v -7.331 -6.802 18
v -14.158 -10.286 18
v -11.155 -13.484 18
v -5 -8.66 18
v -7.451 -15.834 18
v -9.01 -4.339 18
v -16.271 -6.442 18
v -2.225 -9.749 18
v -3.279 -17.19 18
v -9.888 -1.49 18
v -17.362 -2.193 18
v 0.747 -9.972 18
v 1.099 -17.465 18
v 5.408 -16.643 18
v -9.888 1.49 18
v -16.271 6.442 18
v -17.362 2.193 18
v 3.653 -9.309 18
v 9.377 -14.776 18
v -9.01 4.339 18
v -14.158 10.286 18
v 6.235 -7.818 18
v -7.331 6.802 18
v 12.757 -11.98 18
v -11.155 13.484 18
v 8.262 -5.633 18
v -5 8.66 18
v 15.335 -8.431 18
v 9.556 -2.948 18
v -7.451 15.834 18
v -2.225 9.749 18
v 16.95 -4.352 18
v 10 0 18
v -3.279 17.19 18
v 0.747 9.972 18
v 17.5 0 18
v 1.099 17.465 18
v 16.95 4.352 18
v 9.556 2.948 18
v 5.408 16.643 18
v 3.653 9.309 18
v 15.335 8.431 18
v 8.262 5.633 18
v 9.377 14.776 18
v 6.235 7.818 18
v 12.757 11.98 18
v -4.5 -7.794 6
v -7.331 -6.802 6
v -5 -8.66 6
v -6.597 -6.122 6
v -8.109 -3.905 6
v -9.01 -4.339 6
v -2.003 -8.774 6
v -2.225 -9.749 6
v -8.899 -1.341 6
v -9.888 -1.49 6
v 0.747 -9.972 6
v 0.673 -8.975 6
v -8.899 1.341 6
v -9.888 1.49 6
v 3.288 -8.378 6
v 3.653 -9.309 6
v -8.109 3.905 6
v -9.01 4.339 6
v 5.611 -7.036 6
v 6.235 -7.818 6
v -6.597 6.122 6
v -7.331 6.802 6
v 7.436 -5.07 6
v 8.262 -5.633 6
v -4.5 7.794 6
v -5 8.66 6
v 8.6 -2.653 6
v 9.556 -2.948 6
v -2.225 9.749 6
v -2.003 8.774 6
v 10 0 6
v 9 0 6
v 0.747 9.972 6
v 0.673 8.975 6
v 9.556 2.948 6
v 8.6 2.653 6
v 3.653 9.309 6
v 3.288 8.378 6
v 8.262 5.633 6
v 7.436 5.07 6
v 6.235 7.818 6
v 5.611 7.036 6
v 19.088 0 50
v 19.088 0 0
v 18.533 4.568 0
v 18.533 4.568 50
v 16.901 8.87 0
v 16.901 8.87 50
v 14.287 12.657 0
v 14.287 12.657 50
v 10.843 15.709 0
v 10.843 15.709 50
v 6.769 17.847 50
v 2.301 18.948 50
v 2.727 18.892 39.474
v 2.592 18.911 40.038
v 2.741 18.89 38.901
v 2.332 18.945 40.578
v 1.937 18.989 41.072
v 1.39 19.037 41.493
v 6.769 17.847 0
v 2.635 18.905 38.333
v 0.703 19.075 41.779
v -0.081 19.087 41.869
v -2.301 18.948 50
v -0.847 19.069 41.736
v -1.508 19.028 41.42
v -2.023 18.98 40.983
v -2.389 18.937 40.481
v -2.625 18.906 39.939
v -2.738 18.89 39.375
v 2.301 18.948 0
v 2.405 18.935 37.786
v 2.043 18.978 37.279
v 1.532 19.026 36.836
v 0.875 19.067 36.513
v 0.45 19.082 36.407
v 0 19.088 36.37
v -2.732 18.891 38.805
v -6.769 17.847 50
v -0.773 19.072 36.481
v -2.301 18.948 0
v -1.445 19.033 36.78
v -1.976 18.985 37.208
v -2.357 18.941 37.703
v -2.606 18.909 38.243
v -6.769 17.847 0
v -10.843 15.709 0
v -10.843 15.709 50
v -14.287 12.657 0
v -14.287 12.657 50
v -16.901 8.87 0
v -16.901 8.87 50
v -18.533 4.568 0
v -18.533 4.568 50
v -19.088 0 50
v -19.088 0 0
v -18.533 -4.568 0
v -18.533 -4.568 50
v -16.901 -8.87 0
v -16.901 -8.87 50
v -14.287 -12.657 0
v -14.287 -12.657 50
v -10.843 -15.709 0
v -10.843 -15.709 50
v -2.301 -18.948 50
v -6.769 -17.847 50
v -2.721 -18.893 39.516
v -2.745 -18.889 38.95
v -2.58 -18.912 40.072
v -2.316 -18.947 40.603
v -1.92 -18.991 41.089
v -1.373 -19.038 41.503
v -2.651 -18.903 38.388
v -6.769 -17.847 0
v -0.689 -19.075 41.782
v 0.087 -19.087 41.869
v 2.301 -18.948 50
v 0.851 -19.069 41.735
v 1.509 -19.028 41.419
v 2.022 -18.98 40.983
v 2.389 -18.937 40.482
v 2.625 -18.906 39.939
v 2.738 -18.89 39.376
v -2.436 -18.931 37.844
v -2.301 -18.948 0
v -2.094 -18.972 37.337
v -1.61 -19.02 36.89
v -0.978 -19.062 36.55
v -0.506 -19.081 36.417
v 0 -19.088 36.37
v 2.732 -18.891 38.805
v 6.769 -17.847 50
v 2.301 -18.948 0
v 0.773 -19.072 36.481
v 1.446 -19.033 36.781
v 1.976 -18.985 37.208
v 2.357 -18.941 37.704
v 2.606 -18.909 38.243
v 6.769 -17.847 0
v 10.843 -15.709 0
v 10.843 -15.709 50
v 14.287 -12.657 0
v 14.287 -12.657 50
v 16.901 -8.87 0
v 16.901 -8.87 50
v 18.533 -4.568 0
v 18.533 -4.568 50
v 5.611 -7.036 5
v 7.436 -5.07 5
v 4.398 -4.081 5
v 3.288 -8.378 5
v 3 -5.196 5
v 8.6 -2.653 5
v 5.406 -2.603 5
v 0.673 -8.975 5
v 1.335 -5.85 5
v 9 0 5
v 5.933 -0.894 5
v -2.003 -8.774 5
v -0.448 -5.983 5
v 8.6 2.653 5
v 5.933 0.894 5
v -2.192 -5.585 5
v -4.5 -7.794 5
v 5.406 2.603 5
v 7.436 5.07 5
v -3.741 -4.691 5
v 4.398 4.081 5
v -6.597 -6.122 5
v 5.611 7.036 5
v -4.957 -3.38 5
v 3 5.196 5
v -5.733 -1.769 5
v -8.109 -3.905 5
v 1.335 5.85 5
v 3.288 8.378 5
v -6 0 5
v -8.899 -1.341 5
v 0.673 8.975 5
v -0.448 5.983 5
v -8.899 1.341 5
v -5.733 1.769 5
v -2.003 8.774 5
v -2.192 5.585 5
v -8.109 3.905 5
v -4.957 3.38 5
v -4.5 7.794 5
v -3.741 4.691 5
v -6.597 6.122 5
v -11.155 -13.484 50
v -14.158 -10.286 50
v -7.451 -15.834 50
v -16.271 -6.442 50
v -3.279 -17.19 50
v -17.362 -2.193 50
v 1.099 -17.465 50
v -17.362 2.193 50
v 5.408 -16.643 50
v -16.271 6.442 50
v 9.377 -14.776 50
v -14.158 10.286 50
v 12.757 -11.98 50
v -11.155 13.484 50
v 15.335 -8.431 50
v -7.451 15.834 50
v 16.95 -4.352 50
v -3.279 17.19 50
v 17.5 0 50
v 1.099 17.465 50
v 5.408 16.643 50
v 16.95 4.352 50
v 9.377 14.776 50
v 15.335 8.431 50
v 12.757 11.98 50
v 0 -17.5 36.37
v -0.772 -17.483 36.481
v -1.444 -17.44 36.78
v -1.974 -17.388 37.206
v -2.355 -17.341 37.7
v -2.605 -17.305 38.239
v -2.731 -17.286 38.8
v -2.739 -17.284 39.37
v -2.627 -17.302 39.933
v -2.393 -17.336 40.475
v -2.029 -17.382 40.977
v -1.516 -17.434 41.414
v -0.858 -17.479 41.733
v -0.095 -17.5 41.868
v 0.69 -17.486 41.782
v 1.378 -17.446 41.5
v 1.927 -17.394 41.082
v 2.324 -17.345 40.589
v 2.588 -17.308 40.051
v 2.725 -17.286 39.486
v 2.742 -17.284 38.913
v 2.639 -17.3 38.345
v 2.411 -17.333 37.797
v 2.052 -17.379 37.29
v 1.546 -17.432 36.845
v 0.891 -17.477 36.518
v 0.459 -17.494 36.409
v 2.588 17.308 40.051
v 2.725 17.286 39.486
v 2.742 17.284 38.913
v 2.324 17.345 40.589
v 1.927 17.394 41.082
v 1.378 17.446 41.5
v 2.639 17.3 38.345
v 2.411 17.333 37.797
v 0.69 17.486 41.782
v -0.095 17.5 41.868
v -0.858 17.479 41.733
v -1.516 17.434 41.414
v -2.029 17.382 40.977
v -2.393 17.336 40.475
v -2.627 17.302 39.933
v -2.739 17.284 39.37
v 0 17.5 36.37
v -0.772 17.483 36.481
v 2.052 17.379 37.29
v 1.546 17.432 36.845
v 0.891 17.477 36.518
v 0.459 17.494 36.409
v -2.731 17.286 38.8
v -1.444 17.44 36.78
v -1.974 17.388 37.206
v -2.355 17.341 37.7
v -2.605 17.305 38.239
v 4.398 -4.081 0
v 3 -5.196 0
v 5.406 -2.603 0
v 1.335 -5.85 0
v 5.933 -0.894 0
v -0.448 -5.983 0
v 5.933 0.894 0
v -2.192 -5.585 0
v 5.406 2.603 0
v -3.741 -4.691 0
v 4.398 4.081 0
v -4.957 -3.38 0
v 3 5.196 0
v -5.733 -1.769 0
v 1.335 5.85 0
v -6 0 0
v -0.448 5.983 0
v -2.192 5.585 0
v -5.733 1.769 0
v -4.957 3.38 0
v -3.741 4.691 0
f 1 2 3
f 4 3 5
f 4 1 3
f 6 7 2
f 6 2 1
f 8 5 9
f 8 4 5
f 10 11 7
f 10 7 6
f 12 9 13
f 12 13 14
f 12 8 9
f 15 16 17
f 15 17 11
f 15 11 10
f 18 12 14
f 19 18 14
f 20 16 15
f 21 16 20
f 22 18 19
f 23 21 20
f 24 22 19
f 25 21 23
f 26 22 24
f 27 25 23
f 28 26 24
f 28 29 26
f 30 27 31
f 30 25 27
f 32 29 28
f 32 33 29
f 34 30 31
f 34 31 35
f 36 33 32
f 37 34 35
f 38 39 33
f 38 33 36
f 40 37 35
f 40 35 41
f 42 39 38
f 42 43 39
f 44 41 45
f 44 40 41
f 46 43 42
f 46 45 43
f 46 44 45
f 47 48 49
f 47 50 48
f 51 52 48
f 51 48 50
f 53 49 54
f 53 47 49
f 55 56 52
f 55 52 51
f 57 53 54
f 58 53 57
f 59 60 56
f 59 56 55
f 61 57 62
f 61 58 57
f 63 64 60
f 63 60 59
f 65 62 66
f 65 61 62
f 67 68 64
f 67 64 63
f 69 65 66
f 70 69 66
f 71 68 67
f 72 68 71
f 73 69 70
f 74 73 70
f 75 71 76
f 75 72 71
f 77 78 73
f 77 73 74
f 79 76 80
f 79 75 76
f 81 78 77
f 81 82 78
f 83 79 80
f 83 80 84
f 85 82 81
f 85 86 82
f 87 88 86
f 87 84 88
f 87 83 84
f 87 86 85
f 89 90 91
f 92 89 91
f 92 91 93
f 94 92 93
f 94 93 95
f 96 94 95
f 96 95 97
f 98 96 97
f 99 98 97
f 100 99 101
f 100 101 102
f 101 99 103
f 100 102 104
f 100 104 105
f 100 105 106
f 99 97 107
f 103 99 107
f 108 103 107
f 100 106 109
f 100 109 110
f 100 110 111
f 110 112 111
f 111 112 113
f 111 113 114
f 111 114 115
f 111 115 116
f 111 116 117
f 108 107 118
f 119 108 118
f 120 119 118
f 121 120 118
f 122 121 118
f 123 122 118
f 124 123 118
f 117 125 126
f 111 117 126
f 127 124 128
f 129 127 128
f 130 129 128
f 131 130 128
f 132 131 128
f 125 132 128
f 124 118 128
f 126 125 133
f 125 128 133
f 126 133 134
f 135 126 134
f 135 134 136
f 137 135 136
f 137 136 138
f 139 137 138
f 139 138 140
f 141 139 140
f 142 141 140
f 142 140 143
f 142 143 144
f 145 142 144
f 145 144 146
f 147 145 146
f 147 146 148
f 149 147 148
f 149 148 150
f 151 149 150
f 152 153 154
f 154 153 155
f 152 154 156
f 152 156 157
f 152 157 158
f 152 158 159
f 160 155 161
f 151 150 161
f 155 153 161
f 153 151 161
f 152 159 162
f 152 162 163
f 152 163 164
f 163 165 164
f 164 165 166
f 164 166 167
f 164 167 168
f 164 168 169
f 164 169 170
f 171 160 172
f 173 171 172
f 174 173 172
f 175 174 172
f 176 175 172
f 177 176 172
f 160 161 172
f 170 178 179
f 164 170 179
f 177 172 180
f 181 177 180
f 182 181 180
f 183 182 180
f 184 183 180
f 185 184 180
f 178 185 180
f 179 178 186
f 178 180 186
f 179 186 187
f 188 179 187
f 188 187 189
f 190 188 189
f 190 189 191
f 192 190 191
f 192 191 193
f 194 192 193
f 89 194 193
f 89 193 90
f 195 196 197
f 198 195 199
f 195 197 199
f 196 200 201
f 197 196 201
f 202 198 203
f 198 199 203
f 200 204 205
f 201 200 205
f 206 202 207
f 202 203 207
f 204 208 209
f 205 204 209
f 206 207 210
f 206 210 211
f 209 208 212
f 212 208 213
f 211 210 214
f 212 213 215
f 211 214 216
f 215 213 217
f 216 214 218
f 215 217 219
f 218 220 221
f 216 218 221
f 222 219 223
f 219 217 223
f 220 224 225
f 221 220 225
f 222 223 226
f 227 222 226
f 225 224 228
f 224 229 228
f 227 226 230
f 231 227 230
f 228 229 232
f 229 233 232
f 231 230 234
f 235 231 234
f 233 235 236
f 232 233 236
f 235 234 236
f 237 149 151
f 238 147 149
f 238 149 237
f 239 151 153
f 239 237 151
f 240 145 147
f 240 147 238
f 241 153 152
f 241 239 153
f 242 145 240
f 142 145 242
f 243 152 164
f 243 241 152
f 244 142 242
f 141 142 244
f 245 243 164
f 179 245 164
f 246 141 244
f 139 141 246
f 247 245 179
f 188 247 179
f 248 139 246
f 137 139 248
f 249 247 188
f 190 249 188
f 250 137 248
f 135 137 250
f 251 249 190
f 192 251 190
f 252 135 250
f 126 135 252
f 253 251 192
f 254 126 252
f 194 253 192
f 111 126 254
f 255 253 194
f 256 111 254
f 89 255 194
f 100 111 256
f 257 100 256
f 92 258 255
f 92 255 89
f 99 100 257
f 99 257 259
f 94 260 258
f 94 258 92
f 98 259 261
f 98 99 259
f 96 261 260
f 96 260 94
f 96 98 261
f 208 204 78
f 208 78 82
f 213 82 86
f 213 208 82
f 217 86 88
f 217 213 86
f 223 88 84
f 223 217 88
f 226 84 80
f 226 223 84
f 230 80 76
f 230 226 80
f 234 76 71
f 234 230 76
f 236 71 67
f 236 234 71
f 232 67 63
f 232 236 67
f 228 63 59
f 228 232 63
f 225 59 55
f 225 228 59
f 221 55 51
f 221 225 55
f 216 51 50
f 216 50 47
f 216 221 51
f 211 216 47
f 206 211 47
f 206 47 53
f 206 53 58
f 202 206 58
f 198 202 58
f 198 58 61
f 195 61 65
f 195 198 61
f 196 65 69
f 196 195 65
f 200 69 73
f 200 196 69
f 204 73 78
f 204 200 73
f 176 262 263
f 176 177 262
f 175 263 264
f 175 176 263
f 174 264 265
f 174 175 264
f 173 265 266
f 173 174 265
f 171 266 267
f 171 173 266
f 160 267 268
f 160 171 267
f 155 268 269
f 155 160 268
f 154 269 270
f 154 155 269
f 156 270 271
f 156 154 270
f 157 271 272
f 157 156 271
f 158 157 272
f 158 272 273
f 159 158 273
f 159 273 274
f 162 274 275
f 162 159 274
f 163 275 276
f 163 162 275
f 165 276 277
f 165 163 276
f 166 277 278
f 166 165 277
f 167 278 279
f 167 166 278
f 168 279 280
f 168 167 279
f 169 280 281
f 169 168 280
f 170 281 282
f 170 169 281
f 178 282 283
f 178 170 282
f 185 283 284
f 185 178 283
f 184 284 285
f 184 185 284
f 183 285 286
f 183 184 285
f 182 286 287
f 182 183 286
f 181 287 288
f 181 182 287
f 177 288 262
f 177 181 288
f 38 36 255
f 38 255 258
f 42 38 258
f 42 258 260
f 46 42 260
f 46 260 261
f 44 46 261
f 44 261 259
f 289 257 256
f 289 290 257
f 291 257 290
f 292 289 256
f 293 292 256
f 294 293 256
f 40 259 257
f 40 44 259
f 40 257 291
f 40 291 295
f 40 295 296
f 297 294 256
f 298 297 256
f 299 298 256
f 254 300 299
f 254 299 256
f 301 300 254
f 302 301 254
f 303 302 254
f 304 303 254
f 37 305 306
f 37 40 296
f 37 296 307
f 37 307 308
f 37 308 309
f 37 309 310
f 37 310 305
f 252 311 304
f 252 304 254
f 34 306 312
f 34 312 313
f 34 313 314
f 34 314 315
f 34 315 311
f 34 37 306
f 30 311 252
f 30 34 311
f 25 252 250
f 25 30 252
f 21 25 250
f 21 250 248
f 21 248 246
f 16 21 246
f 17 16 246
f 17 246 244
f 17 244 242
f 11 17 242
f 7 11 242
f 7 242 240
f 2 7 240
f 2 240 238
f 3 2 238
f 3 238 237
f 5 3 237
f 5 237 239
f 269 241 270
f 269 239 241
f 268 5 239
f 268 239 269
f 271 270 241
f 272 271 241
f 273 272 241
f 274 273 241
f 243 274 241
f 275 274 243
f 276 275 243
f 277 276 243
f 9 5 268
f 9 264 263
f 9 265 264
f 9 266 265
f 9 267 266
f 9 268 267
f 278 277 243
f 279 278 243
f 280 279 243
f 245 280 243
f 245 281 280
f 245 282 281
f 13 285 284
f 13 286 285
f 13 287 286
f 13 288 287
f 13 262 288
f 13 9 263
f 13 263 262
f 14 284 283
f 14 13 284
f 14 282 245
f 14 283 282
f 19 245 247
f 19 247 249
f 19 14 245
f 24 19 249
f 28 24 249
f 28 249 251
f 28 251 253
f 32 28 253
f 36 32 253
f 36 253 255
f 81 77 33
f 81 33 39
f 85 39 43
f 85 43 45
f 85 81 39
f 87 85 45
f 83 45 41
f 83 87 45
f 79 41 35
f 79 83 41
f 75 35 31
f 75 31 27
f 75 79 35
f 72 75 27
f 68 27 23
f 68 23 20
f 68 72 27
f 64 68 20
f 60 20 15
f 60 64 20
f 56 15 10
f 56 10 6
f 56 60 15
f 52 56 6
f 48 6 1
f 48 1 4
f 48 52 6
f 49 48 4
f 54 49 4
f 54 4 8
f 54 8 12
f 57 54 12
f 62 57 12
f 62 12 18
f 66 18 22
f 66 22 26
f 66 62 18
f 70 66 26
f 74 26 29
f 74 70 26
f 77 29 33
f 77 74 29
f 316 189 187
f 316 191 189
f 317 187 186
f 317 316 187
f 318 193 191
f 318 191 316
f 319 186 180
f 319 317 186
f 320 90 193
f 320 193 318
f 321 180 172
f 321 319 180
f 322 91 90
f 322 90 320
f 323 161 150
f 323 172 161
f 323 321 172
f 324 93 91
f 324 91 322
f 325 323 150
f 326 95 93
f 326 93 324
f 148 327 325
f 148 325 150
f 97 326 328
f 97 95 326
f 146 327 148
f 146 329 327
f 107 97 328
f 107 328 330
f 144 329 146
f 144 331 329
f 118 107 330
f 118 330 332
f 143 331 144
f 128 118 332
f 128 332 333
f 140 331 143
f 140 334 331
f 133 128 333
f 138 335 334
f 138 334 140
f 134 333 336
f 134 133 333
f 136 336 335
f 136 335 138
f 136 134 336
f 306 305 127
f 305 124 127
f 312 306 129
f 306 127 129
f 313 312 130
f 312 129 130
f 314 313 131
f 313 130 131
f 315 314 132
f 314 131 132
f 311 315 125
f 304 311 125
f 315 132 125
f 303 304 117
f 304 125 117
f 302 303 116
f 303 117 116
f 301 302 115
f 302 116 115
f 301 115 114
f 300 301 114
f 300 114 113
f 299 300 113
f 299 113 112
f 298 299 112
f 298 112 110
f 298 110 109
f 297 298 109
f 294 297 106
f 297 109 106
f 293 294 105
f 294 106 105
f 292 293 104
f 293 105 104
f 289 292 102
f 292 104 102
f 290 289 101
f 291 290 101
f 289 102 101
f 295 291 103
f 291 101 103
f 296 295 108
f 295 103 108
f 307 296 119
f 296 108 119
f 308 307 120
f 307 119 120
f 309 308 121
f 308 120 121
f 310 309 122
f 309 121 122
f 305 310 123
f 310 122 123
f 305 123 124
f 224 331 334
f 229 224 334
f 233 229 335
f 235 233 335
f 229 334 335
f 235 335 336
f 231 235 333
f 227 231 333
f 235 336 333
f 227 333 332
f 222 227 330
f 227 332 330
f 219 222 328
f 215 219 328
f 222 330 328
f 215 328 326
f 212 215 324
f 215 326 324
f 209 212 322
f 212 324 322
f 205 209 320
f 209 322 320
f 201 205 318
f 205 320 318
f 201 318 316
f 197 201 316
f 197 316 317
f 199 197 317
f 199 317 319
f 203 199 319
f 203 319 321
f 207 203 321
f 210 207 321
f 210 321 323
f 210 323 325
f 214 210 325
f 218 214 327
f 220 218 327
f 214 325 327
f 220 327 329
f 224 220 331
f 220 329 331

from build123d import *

# Parameters (mm, degrees)
SKETCH1_R           = 19.0875
SKETCH1_R_2         = 17.5
BOSS_EXTRUDE1_DEPTH = 50
SKETCH2_R           = 17.5
SKETCH2_R_2         = 6
BOSS_EXTRUDE2_DEPTH = 5
SKETCH3_R           = 17.5
SKETCH3_R_2         = 9
BOSS_EXTRUDE3_DEPTH = 1
SKETCH4_R           = 17.5
SKETCH4_R_2         = 10
BOSS_EXTRUDE4_DEPTH = 12
SKETCH7_W           = 2.75
SKETCH7_H           = 19.0875


with BuildPart() as part:
    # Sketch1 → Boss-Extrude1 (new body)
    with BuildSketch(Plane.XY):
        Circle(SKETCH1_R)
        Circle(SKETCH1_R_2, mode=Mode.SUBTRACT)
    extrude(amount=BOSS_EXTRUDE1_DEPTH)

    # Sketch2 → Boss-Extrude2 (add)
    with BuildSketch(Plane(origin=(0, 0, 0), x_dir=(-1, 0, 0), z_dir=(0, 0, -1))):
        Circle(SKETCH2_R)
        Circle(SKETCH2_R_2, mode=Mode.SUBTRACT)
    extrude(amount=-BOSS_EXTRUDE2_DEPTH)

    # Sketch3 → Boss-Extrude3 (add)
    with BuildSketch(Plane.XY.offset(5)):
        Circle(SKETCH3_R)
        Circle(SKETCH3_R_2, mode=Mode.SUBTRACT)
    extrude(amount=BOSS_EXTRUDE3_DEPTH)

    # Sketch4 → Boss-Extrude4 (add)
    with BuildSketch(Plane.XY.offset(6)):
        Circle(SKETCH4_R)
        Circle(SKETCH4_R_2, mode=Mode.SUBTRACT)
    extrude(amount=BOSS_EXTRUDE4_DEPTH)

    # Sketch7 → M5 Clearance Hole1 (revolve, cut)
    with BuildSketch(Plane(origin=(0, 0, 39.120000392), x_dir=(0, 0, -1), z_dir=(1, 0, 0))):
        with Locations((1.375, 9.54375)):
            Rectangle(SKETCH7_W, SKETCH7_H)
    m5_clearance_hole1 = revolve(axis=Axis((0, -6.35, 39.120000392), (0, 1, 0)), mode=Mode.SUBTRACT)

    # Mirror1: M5 Clearance Hole1 across plane
    add(m5_clearance_hole1.mirror(Plane.ZX), mode=Mode.SUBTRACT)


solid = part.part
